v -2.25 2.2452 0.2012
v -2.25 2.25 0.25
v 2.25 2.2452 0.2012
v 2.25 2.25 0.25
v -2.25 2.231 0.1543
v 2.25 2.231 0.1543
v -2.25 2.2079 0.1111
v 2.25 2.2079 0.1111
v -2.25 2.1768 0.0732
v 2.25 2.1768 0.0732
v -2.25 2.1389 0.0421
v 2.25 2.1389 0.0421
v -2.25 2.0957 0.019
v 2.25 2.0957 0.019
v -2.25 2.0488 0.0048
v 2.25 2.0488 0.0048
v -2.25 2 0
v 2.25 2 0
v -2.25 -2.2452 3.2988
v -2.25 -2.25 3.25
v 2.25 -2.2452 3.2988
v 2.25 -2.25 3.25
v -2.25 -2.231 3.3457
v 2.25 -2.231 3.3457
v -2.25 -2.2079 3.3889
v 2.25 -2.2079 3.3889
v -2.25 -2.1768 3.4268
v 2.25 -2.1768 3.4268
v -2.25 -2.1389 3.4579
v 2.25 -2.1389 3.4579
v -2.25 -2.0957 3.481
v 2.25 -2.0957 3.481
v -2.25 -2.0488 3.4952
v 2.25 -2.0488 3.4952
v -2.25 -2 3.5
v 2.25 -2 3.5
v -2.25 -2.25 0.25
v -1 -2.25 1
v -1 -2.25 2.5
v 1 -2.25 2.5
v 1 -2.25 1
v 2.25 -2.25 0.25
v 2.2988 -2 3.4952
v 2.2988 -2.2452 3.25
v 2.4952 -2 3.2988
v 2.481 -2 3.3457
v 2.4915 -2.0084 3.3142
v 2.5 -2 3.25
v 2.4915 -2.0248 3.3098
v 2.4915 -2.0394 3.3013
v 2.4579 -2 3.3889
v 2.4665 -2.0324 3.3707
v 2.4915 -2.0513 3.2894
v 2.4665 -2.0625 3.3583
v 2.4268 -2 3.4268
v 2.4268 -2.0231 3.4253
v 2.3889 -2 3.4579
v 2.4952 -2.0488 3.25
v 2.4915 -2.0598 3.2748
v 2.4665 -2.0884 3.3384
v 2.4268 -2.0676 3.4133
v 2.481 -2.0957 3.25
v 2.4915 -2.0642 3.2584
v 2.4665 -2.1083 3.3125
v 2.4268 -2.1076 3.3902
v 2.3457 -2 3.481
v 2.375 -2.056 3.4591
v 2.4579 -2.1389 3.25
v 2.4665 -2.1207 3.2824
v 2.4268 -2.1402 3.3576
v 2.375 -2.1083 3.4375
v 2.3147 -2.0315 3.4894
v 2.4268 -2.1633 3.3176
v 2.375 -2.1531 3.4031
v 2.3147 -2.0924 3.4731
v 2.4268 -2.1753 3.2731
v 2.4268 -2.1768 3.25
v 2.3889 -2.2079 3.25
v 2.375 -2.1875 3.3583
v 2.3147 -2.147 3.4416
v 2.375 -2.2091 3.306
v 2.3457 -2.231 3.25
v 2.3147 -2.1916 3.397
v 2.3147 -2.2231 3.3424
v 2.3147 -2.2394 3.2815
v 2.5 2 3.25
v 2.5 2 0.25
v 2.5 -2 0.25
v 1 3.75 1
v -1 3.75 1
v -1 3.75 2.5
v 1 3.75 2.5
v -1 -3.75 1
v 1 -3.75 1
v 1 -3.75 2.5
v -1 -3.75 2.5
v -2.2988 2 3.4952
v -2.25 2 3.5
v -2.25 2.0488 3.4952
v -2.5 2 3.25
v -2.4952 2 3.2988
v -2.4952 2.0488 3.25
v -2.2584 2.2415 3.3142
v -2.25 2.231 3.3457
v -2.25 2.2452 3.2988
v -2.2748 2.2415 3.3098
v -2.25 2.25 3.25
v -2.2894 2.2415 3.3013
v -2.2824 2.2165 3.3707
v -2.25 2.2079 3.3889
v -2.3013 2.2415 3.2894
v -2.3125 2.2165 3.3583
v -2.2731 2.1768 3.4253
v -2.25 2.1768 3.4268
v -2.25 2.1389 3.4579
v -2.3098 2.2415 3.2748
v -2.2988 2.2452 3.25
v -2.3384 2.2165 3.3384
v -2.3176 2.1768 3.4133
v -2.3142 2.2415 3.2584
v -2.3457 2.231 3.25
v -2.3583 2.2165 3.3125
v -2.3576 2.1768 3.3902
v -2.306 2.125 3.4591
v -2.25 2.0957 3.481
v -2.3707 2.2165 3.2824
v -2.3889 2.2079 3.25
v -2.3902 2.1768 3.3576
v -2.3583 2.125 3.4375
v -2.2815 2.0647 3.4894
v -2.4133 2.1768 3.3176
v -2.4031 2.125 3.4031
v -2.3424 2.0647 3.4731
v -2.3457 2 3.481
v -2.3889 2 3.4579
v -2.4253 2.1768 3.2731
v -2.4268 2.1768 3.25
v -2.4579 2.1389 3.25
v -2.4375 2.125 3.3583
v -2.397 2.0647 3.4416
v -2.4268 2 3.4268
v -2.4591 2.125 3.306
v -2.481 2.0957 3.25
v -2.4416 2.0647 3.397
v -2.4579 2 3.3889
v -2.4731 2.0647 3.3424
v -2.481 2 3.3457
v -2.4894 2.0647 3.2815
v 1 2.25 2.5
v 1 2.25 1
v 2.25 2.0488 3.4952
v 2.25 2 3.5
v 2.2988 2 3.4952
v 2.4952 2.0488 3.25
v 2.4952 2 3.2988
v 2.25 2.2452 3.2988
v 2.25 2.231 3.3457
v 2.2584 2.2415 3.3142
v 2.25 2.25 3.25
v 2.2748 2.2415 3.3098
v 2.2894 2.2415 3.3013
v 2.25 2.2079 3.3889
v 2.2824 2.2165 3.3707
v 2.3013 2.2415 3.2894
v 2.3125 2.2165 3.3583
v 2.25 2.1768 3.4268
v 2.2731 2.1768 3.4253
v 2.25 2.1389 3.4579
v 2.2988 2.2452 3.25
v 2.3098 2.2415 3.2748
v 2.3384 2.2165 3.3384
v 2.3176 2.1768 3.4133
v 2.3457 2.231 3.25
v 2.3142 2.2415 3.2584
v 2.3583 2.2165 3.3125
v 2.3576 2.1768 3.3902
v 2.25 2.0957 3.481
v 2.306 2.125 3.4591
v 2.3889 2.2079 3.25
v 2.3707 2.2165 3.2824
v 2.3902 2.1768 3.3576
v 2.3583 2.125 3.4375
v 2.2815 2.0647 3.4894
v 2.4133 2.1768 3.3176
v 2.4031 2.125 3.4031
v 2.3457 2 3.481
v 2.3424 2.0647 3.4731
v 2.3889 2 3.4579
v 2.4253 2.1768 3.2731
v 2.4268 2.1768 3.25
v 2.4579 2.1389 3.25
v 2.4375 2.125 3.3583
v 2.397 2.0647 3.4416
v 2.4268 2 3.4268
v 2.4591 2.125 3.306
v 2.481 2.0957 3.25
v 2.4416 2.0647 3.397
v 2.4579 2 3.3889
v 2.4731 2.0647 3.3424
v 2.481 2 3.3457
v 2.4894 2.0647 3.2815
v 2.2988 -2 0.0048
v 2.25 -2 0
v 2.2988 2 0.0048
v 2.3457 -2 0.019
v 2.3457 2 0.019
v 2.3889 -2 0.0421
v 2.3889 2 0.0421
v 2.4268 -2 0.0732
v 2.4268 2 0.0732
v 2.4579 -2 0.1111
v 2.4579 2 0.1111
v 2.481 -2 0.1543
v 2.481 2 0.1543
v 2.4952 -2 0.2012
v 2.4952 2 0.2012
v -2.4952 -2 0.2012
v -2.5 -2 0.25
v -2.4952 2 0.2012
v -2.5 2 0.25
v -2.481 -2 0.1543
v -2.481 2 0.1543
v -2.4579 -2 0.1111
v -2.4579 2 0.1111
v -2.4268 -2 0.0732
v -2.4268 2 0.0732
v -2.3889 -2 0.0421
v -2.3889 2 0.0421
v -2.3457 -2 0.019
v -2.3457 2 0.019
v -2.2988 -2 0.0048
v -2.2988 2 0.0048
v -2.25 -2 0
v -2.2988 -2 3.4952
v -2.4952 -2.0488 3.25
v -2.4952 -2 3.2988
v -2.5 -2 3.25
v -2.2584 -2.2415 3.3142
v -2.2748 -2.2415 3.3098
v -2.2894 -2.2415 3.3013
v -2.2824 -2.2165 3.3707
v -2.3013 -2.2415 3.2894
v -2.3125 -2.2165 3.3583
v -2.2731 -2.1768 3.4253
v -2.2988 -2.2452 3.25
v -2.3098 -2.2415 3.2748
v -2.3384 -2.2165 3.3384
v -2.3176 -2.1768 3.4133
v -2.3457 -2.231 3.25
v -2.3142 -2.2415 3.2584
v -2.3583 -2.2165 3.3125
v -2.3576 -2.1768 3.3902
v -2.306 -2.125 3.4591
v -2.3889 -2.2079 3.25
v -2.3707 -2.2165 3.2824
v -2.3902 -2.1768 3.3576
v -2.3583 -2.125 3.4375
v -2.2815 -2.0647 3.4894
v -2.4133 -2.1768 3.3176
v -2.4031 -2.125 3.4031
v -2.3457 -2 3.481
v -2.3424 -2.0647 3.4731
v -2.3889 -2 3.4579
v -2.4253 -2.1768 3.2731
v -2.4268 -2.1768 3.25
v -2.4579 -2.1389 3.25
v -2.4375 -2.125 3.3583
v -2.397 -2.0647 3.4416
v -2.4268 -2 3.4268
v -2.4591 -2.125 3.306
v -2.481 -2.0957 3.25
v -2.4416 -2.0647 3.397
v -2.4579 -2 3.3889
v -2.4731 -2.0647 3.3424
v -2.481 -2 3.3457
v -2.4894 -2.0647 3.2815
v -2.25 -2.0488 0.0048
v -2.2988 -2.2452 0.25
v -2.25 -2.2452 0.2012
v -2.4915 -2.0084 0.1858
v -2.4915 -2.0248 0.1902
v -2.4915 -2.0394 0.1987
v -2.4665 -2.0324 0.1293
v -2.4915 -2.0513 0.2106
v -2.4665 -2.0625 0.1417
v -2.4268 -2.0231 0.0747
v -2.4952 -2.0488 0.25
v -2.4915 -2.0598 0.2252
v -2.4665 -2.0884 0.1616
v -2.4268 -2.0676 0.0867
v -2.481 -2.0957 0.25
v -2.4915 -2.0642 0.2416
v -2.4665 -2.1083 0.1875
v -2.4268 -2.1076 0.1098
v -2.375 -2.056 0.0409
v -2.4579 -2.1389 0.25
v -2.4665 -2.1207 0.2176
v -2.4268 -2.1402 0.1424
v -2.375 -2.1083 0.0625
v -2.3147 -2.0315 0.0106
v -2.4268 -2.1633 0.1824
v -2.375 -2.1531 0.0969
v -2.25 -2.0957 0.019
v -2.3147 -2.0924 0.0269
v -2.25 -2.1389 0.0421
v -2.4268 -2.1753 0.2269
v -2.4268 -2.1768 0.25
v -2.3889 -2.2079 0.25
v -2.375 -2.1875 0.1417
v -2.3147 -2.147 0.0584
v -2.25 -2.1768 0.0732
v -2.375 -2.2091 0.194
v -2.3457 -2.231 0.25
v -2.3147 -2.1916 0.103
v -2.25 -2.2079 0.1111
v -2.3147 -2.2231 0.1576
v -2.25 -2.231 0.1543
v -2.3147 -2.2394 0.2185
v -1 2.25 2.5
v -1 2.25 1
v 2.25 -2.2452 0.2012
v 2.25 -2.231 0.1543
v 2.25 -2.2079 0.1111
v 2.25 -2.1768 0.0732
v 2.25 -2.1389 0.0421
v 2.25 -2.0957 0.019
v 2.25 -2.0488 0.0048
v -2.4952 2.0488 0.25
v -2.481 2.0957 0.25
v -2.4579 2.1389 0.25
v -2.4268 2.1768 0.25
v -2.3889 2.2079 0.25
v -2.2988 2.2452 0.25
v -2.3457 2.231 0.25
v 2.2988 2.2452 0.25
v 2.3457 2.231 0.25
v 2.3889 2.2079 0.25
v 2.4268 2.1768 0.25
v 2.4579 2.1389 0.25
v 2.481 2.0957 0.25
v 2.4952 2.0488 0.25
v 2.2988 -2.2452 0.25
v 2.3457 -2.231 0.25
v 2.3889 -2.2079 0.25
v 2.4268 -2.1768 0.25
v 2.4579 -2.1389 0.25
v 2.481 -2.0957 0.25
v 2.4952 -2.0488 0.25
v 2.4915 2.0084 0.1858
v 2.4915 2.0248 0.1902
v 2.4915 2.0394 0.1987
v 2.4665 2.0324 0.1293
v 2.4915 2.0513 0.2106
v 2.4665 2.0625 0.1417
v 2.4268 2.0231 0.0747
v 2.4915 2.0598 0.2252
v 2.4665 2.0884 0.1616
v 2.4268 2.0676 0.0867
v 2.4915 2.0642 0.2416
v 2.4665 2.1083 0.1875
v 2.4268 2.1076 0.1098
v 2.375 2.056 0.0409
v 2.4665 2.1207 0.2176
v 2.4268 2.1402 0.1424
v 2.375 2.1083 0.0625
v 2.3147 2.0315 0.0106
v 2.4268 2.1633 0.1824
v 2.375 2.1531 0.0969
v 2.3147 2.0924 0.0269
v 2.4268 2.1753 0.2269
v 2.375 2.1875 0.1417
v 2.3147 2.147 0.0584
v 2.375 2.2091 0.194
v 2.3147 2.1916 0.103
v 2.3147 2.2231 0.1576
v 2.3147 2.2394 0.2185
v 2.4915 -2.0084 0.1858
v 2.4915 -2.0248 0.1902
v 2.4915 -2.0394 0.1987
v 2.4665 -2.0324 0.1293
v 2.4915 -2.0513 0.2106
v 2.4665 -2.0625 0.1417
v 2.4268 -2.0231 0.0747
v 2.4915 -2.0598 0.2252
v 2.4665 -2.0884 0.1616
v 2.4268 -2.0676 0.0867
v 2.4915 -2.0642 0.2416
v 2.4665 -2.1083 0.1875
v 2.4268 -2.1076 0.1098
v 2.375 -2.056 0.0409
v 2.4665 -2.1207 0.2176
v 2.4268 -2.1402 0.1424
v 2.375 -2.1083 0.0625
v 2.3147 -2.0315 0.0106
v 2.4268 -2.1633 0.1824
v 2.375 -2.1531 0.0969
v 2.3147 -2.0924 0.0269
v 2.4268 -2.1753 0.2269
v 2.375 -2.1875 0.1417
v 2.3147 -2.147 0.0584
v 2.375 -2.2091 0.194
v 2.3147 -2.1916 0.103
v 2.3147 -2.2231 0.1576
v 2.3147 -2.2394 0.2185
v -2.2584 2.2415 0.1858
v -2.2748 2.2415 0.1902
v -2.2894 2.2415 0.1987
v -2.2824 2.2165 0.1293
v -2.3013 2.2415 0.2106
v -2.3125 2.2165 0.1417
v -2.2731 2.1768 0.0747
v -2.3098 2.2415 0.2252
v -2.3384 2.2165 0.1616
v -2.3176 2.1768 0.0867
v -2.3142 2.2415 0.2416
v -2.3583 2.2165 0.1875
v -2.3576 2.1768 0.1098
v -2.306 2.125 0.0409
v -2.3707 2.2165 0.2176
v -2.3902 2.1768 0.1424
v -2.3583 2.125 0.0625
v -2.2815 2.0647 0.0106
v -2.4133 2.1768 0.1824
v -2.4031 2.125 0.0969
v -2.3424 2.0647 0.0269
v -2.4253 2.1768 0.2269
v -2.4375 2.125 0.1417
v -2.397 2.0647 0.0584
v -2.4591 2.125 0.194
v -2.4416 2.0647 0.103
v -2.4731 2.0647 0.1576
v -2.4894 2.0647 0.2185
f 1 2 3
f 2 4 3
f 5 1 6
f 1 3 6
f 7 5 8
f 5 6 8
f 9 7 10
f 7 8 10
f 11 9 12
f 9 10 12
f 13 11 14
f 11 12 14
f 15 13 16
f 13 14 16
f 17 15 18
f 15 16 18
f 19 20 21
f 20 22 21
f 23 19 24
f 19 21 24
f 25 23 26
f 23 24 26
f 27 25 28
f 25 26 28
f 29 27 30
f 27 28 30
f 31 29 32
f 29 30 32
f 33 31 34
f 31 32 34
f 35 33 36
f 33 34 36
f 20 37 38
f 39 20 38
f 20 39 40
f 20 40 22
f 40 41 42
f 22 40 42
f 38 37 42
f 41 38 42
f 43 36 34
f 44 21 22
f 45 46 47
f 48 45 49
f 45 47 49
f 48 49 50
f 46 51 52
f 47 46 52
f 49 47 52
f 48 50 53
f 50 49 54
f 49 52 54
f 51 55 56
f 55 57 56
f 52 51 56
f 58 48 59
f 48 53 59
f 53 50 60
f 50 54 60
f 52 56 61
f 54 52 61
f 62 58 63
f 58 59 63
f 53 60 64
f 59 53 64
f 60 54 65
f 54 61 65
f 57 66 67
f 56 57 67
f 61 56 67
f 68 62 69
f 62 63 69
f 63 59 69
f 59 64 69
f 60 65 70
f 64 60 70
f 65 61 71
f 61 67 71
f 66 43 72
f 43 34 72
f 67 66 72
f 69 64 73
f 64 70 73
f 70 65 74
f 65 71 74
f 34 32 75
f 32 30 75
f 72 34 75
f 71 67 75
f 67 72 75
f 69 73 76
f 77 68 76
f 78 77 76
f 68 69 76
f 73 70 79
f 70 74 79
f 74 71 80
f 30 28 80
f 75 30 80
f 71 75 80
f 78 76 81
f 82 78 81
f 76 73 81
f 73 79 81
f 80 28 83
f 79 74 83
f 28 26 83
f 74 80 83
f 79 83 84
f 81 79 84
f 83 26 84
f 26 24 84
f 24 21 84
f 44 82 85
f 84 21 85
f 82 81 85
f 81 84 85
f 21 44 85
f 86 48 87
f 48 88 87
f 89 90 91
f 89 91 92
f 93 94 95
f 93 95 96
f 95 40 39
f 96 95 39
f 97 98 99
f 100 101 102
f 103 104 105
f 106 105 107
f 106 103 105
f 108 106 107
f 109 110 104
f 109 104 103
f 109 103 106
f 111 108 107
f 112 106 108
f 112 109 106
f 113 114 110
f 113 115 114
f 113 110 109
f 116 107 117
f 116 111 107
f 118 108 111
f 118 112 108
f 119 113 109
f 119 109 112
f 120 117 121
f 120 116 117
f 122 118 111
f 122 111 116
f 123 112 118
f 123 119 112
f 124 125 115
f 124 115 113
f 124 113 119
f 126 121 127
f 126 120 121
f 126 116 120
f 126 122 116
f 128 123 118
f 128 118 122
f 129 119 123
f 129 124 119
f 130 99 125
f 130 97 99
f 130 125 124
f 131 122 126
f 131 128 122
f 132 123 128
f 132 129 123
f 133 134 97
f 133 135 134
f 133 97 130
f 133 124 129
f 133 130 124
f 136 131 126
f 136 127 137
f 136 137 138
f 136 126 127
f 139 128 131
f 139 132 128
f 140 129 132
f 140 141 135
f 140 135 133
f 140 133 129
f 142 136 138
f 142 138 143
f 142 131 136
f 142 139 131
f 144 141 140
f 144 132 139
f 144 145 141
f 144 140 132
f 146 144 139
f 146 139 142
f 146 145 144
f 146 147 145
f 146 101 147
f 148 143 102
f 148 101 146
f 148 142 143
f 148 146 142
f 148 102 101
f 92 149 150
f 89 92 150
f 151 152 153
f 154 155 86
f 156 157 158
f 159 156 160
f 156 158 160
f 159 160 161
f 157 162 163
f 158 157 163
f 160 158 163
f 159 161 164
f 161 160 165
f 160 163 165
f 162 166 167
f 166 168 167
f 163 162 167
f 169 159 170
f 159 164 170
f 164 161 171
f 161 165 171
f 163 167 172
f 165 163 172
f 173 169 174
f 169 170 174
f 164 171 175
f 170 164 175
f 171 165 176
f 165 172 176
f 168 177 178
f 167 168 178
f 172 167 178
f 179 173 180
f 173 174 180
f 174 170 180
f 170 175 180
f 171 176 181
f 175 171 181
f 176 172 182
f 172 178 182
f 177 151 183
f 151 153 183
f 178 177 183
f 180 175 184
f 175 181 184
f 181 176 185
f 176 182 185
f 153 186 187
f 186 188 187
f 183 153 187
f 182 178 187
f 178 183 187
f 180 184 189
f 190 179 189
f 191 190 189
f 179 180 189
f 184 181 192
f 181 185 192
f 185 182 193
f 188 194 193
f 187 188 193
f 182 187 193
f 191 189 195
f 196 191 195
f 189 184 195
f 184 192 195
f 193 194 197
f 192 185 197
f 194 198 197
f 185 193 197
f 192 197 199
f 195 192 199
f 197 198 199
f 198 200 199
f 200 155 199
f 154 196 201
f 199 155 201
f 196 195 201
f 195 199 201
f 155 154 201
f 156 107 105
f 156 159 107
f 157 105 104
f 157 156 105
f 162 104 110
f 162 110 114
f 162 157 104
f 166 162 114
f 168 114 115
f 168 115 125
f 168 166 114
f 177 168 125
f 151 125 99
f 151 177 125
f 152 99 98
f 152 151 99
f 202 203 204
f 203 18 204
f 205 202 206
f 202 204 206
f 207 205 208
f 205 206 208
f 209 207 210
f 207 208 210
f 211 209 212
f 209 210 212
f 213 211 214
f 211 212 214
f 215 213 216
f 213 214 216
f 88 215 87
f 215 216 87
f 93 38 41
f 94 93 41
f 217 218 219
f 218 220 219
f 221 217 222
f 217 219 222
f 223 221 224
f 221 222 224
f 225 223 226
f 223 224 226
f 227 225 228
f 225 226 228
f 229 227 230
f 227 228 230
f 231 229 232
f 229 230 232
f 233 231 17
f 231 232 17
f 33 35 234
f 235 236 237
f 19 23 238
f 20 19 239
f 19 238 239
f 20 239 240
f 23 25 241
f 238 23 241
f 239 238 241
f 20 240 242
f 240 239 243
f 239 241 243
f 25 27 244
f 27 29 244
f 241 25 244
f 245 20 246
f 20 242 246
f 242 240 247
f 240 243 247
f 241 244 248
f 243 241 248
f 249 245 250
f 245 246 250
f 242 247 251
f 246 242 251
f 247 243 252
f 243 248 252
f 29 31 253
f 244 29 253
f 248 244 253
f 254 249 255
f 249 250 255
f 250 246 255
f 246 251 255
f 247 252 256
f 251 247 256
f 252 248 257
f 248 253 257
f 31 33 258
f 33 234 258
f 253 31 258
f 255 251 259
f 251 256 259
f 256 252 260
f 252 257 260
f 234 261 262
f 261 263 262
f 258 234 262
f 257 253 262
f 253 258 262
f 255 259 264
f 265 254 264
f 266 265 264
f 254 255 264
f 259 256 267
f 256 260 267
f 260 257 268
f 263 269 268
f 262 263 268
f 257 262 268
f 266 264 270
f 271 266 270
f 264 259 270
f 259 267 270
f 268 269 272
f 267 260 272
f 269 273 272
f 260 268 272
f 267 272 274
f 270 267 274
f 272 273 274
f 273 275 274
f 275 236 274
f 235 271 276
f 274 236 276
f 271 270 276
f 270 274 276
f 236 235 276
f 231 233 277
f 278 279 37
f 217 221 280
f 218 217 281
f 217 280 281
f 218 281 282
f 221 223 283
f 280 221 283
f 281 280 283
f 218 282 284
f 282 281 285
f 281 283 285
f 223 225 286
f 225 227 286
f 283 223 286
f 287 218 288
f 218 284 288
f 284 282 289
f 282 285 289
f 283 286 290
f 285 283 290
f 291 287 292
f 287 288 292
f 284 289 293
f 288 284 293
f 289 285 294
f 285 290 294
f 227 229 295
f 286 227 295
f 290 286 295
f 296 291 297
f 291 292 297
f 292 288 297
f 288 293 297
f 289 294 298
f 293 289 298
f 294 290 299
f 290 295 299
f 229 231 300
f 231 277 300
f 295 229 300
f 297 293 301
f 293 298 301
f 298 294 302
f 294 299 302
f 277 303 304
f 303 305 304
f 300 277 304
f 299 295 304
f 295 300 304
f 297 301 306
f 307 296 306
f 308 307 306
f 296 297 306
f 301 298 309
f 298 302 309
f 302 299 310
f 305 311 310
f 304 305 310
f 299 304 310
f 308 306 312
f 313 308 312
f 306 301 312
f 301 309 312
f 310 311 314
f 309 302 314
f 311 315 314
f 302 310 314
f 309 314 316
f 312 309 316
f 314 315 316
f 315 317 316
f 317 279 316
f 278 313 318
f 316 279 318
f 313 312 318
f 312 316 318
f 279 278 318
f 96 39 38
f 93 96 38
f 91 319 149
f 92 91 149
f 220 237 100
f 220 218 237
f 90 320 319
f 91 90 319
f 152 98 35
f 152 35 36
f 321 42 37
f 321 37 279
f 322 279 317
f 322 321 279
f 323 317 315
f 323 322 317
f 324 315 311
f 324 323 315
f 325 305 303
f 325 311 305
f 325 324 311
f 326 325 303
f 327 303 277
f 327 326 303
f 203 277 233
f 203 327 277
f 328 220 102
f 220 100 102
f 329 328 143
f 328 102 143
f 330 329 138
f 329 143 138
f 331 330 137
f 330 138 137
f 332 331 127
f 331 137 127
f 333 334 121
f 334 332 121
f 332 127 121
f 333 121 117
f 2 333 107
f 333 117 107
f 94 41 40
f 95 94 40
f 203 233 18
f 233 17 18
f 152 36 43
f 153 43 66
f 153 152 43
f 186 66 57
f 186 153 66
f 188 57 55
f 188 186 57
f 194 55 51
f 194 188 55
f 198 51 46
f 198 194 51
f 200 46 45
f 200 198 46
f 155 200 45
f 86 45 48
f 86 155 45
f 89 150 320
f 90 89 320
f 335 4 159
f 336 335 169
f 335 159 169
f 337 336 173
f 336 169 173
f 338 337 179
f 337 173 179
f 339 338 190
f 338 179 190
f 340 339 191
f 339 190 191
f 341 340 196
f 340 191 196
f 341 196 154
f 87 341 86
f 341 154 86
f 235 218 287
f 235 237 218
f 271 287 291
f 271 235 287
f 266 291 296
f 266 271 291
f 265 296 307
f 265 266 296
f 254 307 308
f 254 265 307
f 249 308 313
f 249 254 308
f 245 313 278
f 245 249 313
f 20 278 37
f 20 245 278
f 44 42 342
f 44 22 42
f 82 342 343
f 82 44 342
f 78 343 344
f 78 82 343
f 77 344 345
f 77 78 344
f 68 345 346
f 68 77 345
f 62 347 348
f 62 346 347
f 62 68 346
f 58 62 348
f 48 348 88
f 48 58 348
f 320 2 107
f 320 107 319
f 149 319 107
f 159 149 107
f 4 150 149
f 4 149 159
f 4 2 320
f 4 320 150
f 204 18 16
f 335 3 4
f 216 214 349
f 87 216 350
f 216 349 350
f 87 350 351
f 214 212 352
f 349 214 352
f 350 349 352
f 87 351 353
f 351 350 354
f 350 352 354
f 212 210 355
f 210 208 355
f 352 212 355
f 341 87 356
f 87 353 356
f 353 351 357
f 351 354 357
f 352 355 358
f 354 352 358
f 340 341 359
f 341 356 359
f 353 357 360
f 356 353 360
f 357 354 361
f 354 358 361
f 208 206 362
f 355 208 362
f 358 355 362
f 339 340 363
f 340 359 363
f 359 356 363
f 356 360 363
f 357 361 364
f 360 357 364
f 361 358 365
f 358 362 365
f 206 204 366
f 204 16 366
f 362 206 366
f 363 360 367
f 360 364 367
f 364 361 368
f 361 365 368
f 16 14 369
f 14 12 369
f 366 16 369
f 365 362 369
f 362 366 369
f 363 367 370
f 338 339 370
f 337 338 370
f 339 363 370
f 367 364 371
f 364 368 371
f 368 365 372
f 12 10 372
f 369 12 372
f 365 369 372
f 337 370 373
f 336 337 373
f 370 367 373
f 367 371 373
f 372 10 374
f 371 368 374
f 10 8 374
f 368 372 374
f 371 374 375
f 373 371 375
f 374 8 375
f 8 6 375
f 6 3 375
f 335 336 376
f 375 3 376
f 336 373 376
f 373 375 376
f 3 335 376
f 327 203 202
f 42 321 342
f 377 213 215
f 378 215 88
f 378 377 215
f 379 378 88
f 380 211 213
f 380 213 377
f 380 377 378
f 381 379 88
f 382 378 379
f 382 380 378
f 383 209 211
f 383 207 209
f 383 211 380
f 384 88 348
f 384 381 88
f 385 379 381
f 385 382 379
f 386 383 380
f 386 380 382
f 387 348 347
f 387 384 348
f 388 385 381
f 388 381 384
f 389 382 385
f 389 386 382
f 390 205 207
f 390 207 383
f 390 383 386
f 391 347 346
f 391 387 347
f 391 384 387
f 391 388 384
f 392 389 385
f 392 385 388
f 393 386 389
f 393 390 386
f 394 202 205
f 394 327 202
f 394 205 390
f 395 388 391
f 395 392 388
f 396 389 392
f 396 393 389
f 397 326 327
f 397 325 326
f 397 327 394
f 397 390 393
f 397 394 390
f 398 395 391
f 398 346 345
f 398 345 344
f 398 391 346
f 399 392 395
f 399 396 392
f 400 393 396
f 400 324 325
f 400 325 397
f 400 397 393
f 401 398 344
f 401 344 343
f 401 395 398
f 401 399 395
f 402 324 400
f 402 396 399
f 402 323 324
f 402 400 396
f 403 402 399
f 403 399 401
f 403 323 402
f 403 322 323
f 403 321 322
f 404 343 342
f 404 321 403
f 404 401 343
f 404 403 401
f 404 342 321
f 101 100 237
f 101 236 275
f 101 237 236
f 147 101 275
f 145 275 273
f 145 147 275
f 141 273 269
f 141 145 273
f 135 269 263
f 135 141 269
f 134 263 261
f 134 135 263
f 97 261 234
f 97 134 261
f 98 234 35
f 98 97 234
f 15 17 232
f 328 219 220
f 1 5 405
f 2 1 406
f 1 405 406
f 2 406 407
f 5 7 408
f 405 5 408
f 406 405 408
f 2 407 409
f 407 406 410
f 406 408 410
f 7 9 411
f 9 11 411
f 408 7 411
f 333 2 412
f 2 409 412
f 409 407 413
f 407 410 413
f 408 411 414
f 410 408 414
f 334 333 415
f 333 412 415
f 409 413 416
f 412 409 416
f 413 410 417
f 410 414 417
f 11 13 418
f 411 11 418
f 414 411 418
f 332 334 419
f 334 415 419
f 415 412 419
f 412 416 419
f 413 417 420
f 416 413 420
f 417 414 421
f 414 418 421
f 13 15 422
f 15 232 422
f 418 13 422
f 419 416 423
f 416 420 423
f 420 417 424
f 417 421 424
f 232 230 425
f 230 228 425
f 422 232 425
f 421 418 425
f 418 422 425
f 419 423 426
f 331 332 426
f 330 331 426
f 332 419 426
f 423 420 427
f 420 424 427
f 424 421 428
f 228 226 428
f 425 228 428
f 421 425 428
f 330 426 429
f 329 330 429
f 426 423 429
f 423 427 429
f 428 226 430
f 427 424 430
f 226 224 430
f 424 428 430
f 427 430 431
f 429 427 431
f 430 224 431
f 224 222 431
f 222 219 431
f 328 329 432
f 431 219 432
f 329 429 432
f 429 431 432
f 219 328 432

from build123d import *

# Parameters (mm, degrees)
SKETCH1_W           = 5
SKETCH1_H           = 4.5
BOSS_EXTRUDE1_DEPTH = 3.5
BOSS_EXTRUDE2_DEPTH = 1.5
BOSS_EXTRUDE3_DEPTH = 1.5
FILLET1_R           = 0.25


with BuildPart() as part:
    # Sketch1 → Boss-Extrude1 (new body)
    with BuildSketch(Plane.XY):
        Rectangle(SKETCH1_W, SKETCH1_H)
    extrude(amount=BOSS_EXTRUDE1_DEPTH)

    # Sketch2 → Boss-Extrude2 (add)
    with BuildSketch(Plane(origin=(0, 2.25, 0), x_dir=(1, 0, 0), z_dir=(0, 1, 0))):
        Polygon((-1, -2.45), (1, -1.05), (1, -1), (-1, -1), align=None)
        Polygon((1, -2.5), (1, -1.05), (-1, -2.45), (-1, -2.5), align=None)
    extrude(amount=BOSS_EXTRUDE2_DEPTH)

    # Sketch3 → Boss-Extrude3 (add)
    with BuildSketch(Plane(origin=(0, -2.25, 0), x_dir=(-1, 0, 0), z_dir=(0, -1, 0))):
        Polygon((-1, -1), (-1, -2.45), (1, -1.05), (1, -1), align=None)
        Polygon((1, -1.05), (-1, -2.45), (-1, -2.5), (1, -2.5), align=None)
    extrude(amount=BOSS_EXTRUDE3_DEPTH)

    # Fillet1
    fillet1_edges = [part.edges().sort_by_distance(p)[0] for p in [
        (-2.5, 0, 3.5),
        (0, -2.25, 3.5),
        (2.5, 0, 3.5),
        (0, -2.25, 0),
        (-2.5, 0, 0),
        (0, 2.25, 0),
        (2.5, 0, 0),
        (0, 2.25, 3.5),
        (2.5, -2.25, 1.75),
        (-2.5, -2.25, 1.75),
        (-2.5, 2.25, 1.75),
        (2.5, 2.25, 1.75),
    ]]
    fillet(fillet1_edges, radius=FILLET1_R)


solid = part.part
